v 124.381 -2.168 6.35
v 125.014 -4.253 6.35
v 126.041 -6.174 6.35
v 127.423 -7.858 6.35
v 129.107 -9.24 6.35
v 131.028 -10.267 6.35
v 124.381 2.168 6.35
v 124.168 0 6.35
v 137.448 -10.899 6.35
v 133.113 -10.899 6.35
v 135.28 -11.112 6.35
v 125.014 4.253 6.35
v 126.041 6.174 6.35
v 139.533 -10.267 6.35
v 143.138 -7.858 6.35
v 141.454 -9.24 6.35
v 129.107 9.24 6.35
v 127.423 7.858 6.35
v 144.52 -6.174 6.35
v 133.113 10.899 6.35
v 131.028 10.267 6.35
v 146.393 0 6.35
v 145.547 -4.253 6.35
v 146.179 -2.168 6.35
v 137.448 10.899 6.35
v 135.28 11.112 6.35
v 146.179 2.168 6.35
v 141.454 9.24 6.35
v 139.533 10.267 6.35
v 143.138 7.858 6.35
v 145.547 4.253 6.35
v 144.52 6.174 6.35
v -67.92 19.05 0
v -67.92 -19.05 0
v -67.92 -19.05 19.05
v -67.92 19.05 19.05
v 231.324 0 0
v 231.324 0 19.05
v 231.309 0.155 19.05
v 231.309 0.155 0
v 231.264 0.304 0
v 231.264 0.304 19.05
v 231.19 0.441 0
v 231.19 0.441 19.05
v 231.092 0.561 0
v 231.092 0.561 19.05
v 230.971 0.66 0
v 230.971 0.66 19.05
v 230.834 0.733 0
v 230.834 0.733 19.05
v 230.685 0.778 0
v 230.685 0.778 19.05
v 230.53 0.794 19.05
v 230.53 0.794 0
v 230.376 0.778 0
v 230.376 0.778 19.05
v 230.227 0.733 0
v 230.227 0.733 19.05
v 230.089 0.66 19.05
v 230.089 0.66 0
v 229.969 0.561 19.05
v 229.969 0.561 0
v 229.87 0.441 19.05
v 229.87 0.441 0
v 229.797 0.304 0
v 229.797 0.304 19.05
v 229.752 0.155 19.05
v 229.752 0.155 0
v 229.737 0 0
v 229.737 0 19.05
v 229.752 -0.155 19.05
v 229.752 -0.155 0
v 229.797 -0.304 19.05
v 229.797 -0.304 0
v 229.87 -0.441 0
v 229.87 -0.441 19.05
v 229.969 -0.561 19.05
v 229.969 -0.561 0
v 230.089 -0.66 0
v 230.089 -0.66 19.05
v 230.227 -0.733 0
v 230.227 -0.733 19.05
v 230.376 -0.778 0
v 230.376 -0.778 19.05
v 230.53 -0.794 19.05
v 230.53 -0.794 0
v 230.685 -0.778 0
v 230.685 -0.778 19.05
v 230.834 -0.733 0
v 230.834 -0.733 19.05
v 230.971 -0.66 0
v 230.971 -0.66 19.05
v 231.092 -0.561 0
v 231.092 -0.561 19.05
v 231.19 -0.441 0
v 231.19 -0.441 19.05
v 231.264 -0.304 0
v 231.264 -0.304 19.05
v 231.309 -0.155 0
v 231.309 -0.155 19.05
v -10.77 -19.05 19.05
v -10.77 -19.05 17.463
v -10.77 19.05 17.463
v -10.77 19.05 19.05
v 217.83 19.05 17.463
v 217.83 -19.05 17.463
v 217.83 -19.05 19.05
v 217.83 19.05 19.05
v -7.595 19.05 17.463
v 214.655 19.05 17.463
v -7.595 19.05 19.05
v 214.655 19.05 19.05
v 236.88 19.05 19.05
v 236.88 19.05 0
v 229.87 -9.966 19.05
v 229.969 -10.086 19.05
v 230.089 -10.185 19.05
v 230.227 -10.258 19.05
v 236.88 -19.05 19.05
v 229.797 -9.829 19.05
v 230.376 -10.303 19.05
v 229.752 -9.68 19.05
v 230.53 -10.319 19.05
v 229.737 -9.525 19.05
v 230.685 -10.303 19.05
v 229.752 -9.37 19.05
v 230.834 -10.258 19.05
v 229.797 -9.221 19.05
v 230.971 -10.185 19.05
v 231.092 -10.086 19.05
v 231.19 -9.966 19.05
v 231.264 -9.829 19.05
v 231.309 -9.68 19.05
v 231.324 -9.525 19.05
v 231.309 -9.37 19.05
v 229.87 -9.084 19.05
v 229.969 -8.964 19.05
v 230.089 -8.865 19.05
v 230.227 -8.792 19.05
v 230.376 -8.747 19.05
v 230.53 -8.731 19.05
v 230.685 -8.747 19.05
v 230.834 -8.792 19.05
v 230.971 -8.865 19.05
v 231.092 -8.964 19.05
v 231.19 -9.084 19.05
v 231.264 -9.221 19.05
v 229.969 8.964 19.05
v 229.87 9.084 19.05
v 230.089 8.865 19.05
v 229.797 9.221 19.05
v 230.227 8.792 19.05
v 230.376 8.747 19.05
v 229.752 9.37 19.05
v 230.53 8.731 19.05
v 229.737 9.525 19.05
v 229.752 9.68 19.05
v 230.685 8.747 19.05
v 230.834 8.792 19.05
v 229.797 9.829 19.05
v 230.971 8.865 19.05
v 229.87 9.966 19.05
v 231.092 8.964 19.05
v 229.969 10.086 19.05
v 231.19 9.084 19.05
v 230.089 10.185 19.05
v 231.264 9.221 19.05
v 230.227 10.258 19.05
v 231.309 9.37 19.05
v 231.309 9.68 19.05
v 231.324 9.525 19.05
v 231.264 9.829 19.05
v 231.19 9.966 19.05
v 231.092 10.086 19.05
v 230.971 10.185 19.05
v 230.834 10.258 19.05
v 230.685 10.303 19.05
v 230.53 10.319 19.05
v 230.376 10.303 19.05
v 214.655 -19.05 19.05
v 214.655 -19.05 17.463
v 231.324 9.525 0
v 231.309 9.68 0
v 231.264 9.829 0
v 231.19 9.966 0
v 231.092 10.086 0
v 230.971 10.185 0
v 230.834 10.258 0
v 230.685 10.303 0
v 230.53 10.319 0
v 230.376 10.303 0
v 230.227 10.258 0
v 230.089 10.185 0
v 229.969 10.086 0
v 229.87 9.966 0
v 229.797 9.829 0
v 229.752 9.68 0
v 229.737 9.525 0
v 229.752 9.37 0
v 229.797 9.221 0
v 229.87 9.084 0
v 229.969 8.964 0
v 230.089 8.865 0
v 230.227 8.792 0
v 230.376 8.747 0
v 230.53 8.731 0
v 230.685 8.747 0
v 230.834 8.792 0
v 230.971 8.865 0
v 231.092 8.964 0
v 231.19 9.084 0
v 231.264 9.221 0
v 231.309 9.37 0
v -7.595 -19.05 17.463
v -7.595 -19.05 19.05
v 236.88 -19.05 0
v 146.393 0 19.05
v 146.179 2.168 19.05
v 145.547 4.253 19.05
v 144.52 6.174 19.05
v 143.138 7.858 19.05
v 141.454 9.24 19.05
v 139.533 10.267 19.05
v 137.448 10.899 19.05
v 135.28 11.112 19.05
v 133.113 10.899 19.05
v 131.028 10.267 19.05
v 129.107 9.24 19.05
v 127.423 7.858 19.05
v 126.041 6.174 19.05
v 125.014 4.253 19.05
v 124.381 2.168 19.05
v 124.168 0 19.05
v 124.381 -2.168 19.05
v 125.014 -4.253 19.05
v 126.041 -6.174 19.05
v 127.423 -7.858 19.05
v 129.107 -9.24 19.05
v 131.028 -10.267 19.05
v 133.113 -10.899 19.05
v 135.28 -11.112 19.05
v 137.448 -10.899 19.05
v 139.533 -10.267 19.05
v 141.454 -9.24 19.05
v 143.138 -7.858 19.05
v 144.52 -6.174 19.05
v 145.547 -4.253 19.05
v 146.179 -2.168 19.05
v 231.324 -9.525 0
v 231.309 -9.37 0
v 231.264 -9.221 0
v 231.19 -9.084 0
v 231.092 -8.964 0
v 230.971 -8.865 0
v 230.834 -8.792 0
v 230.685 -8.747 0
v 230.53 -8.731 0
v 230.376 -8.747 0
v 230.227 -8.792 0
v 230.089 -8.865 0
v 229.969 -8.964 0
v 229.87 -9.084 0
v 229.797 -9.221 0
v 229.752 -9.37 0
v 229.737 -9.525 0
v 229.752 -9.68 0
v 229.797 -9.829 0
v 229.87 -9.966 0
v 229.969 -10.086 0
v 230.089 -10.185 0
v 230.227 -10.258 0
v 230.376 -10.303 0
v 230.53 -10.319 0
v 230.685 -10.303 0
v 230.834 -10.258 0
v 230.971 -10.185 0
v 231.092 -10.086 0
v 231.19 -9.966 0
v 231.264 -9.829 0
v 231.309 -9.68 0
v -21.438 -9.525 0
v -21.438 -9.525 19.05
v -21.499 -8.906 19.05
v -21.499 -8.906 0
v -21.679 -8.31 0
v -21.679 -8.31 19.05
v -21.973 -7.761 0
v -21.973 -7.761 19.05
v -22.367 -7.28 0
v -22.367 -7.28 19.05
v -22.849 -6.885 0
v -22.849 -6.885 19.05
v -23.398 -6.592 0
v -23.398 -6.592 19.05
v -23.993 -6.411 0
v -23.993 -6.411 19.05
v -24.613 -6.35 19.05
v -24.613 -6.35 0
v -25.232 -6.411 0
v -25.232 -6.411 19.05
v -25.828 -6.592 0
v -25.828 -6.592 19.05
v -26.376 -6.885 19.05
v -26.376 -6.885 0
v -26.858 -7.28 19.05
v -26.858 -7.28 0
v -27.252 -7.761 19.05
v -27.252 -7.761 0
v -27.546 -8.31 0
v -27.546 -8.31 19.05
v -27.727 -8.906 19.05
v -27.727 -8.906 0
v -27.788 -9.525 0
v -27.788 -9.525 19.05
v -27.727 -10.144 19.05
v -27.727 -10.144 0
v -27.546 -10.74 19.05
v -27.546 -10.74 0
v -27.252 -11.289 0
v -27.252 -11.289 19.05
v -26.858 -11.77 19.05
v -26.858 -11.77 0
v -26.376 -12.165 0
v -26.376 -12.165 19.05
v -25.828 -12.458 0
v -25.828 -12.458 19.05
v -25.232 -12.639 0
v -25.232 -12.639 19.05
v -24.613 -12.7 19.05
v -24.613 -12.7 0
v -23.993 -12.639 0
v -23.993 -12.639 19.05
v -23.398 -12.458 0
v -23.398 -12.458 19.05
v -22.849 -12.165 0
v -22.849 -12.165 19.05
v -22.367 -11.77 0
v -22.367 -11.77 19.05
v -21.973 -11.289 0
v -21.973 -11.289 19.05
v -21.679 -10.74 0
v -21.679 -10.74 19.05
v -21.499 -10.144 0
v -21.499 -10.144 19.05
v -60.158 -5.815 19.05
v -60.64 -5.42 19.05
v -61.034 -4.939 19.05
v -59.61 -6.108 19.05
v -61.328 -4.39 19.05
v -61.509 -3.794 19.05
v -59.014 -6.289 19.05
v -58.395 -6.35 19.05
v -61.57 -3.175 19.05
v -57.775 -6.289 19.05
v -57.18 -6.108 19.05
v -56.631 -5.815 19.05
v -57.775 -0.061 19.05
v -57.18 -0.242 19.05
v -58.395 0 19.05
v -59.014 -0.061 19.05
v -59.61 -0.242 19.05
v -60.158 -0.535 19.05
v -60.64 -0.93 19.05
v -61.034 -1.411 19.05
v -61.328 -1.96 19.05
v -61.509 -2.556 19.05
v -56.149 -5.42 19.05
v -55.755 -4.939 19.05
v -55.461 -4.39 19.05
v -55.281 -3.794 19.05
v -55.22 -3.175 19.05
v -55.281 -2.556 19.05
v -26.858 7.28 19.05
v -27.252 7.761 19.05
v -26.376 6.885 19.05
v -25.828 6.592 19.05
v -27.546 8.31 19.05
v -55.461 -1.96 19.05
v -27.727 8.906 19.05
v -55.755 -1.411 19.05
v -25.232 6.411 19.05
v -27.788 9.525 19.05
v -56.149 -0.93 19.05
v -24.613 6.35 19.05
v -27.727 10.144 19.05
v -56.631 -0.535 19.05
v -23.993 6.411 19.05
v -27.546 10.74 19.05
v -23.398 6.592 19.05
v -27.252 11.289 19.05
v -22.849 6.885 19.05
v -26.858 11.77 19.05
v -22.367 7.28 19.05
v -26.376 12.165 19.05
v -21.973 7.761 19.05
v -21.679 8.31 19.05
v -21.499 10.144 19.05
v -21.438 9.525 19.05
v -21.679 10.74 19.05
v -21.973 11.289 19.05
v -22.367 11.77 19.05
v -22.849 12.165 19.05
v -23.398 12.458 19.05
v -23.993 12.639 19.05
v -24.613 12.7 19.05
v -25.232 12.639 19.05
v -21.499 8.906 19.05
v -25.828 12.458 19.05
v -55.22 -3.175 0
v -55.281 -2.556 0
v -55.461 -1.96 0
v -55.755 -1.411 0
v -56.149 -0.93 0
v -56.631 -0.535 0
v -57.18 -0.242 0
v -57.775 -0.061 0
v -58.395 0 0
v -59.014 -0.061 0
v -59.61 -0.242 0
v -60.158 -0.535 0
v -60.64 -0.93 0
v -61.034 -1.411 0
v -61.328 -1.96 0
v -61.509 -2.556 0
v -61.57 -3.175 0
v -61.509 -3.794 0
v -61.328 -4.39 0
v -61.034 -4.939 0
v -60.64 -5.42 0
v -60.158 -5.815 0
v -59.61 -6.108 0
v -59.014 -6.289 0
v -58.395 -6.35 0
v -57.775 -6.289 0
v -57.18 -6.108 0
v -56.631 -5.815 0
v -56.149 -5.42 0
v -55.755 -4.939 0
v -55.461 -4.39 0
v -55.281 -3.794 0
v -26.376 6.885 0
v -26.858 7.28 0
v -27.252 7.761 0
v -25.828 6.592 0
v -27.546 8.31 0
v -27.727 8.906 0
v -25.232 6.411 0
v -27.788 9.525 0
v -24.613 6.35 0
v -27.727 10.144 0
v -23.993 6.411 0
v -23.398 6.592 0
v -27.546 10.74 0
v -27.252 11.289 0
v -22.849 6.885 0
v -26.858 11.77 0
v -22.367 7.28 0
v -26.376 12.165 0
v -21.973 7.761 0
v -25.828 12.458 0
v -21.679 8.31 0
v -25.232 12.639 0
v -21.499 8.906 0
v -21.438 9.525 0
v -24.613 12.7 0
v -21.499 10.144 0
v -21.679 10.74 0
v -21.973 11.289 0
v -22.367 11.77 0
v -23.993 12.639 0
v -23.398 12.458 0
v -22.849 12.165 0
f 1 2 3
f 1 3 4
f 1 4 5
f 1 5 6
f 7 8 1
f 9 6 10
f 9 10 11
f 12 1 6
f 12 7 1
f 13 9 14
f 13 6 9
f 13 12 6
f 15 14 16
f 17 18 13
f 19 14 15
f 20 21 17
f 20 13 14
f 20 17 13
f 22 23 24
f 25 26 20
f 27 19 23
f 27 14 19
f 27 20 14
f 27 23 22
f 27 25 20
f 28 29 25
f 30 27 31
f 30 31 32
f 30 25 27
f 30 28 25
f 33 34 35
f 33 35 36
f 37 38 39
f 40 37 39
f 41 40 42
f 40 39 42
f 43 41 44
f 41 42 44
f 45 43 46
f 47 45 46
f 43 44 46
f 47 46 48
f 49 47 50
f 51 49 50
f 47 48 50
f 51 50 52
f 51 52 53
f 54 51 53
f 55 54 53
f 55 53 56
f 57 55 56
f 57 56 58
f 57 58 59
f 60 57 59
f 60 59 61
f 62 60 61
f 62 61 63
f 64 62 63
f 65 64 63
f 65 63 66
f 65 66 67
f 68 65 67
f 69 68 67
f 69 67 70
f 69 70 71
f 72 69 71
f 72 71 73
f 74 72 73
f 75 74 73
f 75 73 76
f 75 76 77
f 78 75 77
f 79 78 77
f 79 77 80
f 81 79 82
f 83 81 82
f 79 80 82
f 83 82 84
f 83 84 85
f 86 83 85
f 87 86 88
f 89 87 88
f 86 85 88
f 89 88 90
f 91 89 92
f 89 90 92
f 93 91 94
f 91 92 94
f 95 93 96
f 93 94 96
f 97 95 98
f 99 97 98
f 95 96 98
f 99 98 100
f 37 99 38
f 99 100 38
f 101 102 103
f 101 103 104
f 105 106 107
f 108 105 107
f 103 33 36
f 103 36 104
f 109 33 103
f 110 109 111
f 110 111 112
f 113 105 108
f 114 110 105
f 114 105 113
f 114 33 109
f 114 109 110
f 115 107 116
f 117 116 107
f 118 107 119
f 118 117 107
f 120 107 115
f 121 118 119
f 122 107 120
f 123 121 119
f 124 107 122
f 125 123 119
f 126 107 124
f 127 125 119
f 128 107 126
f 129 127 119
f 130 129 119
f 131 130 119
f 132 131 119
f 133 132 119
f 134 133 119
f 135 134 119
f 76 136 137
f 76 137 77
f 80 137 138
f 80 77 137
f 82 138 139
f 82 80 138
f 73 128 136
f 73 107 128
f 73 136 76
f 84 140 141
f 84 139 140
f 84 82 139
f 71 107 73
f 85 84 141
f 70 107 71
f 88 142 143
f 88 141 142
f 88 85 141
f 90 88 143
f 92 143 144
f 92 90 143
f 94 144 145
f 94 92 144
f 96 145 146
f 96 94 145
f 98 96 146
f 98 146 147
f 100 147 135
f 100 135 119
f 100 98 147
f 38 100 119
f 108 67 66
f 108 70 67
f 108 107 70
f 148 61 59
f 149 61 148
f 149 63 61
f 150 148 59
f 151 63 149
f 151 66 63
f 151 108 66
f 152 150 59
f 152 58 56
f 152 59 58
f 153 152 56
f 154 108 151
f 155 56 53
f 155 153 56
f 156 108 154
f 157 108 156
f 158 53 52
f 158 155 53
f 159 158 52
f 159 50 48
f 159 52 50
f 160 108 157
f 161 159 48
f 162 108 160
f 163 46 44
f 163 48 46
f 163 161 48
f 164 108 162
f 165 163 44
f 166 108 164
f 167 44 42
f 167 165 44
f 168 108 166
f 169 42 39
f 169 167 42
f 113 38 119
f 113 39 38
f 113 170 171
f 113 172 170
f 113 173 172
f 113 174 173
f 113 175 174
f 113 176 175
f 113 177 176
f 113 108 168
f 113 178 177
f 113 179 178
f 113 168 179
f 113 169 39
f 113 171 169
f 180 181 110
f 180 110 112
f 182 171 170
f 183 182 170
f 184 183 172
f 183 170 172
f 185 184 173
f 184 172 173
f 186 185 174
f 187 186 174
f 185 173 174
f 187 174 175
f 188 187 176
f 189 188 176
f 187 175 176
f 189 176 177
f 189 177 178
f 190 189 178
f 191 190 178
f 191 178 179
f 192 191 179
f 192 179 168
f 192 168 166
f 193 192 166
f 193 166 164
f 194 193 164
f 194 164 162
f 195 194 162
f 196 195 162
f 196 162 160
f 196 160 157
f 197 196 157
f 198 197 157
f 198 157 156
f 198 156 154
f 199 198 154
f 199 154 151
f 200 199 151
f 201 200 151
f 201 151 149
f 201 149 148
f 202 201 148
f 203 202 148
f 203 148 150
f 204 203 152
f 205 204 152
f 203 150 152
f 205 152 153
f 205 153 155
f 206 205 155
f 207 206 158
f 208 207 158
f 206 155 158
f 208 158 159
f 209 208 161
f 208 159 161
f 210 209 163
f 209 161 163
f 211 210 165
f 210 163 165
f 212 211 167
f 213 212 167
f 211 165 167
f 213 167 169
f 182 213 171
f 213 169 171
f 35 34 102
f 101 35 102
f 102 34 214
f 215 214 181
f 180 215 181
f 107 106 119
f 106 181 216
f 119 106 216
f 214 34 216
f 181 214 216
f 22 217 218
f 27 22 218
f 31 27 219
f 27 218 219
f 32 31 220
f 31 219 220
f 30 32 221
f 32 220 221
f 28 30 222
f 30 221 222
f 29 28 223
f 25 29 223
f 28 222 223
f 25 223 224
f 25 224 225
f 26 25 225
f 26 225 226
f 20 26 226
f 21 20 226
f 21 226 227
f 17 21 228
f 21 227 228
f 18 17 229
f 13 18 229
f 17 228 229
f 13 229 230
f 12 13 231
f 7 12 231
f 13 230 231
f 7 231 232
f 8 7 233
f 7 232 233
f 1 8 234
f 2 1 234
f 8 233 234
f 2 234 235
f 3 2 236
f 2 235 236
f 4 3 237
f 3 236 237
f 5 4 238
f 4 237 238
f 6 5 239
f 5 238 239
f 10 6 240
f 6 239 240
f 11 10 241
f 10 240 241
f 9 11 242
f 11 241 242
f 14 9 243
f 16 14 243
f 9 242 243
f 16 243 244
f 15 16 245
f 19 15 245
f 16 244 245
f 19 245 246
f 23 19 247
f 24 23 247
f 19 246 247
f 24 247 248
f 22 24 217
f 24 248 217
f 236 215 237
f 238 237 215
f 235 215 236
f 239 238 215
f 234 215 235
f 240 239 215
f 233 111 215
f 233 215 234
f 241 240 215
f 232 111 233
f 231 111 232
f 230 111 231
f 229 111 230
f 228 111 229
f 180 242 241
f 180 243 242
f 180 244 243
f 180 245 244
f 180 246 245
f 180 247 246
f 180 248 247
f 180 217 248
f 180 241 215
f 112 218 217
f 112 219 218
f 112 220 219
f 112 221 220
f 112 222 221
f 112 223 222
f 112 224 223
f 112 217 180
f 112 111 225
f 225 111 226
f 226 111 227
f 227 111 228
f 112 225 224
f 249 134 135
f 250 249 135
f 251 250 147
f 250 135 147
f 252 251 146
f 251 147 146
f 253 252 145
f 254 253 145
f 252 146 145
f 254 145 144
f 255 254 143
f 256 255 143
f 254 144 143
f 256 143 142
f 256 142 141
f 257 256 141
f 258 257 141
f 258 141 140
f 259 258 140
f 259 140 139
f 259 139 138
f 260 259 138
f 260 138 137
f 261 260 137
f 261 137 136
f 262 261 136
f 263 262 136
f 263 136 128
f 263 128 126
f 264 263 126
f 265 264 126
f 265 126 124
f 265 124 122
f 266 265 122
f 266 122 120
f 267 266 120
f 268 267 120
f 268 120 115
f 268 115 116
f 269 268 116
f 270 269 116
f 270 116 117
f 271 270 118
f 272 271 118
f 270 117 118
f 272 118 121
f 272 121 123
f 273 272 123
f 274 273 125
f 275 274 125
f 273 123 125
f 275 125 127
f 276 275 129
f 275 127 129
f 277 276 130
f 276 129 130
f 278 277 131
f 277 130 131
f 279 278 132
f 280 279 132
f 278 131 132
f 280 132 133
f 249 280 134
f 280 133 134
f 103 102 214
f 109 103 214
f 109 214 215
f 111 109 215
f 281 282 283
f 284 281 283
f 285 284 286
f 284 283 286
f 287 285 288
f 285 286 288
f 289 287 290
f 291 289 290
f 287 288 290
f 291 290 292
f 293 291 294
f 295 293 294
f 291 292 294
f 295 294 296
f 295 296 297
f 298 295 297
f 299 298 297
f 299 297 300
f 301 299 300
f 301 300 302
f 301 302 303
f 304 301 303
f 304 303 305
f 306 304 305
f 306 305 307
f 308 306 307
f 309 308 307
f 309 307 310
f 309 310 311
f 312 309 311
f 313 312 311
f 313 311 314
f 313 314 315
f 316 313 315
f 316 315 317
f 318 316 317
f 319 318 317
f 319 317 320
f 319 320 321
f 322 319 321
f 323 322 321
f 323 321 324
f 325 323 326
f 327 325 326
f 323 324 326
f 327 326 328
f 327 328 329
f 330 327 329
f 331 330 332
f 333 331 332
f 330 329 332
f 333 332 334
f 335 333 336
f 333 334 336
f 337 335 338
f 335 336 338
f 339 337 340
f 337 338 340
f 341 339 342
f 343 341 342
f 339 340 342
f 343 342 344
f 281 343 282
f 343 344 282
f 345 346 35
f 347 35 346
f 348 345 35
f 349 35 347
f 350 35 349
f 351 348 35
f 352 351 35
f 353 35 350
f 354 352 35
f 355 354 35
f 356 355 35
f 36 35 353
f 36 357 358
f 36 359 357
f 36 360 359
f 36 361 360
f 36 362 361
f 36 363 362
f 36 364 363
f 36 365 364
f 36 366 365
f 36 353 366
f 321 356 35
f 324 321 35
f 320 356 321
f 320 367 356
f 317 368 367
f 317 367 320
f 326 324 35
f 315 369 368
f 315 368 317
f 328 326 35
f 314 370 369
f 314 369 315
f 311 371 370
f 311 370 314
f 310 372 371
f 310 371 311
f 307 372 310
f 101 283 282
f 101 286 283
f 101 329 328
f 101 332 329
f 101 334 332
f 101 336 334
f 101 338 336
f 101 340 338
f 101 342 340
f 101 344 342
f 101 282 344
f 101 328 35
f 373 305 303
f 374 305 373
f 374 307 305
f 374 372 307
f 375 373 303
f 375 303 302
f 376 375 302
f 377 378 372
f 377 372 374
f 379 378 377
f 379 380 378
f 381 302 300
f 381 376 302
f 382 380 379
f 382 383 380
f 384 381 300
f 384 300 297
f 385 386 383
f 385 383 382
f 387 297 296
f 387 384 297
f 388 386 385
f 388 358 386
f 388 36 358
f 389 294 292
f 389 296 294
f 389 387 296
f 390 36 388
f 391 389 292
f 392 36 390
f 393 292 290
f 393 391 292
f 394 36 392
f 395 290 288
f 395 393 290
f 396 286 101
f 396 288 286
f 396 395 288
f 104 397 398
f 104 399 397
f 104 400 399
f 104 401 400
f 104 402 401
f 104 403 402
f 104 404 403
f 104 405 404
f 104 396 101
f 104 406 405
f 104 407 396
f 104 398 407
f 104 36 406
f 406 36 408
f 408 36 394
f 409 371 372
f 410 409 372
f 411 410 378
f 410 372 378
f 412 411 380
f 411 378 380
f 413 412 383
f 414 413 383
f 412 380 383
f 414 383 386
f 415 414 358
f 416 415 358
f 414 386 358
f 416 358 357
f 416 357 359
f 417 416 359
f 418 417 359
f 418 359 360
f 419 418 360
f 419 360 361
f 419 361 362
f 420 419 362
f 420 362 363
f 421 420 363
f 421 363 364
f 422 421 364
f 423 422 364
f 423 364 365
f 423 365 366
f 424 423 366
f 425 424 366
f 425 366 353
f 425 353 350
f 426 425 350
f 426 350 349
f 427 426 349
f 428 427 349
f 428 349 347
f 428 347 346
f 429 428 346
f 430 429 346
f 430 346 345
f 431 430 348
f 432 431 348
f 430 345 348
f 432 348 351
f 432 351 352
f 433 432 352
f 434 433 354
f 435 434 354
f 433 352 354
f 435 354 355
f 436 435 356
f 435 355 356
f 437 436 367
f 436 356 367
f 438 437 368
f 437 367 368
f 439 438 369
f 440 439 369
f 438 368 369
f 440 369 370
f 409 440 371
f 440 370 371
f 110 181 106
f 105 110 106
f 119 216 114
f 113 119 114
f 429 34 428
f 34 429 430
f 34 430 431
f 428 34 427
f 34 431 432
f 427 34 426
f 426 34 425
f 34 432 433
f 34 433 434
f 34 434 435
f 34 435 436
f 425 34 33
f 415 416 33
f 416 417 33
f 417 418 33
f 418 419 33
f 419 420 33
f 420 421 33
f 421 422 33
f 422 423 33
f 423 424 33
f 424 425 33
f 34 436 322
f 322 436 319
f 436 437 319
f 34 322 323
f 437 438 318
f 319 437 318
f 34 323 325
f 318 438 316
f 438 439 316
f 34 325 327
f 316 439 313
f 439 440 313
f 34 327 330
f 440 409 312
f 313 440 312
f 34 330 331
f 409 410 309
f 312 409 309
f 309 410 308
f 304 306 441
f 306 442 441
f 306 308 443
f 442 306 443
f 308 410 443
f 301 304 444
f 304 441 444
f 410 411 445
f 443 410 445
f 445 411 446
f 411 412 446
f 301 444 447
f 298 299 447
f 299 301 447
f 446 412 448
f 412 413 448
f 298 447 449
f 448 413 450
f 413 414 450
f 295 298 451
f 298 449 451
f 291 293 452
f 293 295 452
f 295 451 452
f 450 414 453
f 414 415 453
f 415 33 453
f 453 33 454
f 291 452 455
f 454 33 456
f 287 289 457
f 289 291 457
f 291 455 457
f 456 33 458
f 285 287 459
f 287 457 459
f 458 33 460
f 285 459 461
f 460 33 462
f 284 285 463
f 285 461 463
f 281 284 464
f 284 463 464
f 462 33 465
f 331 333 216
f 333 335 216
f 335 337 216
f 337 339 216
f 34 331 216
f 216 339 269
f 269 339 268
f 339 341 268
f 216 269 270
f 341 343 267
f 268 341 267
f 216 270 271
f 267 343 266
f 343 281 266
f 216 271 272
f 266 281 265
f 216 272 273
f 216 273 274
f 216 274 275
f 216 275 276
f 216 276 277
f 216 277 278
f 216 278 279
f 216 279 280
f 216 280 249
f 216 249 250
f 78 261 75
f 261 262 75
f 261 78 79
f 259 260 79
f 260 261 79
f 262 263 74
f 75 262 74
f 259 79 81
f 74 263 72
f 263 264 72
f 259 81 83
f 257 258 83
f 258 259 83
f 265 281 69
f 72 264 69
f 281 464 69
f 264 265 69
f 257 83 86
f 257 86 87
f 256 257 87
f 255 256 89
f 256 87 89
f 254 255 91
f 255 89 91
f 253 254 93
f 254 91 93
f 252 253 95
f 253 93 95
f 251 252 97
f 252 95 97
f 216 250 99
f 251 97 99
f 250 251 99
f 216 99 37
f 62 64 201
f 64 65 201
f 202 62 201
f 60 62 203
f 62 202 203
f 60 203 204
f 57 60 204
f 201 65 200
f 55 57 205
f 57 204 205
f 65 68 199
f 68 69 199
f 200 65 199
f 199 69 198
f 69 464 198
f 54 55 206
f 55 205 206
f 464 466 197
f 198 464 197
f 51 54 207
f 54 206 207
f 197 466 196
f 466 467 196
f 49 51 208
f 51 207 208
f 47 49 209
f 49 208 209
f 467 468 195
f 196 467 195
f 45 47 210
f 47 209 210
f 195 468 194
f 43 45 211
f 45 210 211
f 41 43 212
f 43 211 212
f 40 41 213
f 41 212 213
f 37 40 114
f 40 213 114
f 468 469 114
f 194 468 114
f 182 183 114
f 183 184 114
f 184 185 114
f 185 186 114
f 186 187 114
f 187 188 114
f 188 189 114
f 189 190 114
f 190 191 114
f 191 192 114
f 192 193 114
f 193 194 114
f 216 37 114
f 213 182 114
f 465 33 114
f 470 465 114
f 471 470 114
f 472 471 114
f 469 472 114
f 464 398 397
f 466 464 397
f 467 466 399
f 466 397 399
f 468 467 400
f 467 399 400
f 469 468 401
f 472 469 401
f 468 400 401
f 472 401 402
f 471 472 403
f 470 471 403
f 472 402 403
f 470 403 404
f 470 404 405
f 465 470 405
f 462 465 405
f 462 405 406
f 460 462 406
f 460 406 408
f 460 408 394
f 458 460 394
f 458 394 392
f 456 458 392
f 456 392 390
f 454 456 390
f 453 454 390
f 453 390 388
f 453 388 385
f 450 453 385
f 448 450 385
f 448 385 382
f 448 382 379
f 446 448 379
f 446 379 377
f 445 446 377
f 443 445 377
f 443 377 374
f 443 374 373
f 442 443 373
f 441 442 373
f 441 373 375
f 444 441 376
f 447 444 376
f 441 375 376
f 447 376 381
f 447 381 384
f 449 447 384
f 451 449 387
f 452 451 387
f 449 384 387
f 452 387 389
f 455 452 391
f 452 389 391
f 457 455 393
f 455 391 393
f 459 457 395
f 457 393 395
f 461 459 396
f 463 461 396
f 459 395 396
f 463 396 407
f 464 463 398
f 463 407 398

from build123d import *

# Parameters (mm, degrees)
F0_W      = 304.8
F0_H      = 38.1
F1_DEPTH  = 19.05
F2_R      = 11.1125
F3_DEPTH  = 12.7
F4_R      = 3.175
F5_DEPTH  = 19.051
F6_R      = 3.175
F7_DEPTH  = 19.051
F8_R      = 0.79375
F9_DEPTH  = 19.051
F10_W     = 3.175
F10_H     = 1.5875
F11_DEPTH = 38.101


with BuildPart() as f1:
    # F0 (on Top) → F1 (new body)
    with BuildSketch(Plane.XY):
        with Locations((84.480461, 0)):
            Rectangle(F0_W, F0_H)
    extrude(amount=F1_DEPTH)

    # F2 (on face) → F3 (cut)
    with BuildSketch(Plane.XY.offset(19.05)):
        with Locations((135.280461, 0)):
            Circle(F2_R)
    extrude(amount=-F3_DEPTH, mode=Mode.SUBTRACT)

    # F4 (on face) → F5 (cut, through all)
    with BuildSketch(Plane.XY.offset(19.05)):
        with Locations((-58.394539, -3.175)):
            Circle(F4_R)
    extrude(amount=-F5_DEPTH, mode=Mode.SUBTRACT)

    # F6 (on face) → F7 (cut, through all)
    with BuildSketch(Plane.XY.offset(19.05)):
        with Locations((-24.612539, -9.525)):
            Circle(F6_R)
        with Locations((-24.612539, 9.525)):
            Circle(F6_R)
    extrude(amount=-F7_DEPTH, mode=Mode.SUBTRACT)

    # F8 (on face) → F9 (cut, through all)
    with BuildSketch(Plane.XY.offset(19.05)):
        with Locations((230.530461, 9.525)):
            Circle(F8_R)
        with Locations((230.530461, 0)):
            Circle(F8_R)
        with Locations((230.530461, -9.525)):
            Circle(F8_R)
    extrude(amount=-F9_DEPTH, mode=Mode.SUBTRACT)

    # F10 (on face) → F11 (cut, through all)
    with BuildSketch(Plane.XZ.offset(19.05)):
        with Locations((-9.182039, 18.25625)):
            Rectangle(F10_W, F10_H)
        with Locations((216.242961, 18.25625)):
            Rectangle(F10_W, F10_H)
    extrude(amount=-F11_DEPTH, mode=Mode.SUBTRACT)


solid = f1.part
